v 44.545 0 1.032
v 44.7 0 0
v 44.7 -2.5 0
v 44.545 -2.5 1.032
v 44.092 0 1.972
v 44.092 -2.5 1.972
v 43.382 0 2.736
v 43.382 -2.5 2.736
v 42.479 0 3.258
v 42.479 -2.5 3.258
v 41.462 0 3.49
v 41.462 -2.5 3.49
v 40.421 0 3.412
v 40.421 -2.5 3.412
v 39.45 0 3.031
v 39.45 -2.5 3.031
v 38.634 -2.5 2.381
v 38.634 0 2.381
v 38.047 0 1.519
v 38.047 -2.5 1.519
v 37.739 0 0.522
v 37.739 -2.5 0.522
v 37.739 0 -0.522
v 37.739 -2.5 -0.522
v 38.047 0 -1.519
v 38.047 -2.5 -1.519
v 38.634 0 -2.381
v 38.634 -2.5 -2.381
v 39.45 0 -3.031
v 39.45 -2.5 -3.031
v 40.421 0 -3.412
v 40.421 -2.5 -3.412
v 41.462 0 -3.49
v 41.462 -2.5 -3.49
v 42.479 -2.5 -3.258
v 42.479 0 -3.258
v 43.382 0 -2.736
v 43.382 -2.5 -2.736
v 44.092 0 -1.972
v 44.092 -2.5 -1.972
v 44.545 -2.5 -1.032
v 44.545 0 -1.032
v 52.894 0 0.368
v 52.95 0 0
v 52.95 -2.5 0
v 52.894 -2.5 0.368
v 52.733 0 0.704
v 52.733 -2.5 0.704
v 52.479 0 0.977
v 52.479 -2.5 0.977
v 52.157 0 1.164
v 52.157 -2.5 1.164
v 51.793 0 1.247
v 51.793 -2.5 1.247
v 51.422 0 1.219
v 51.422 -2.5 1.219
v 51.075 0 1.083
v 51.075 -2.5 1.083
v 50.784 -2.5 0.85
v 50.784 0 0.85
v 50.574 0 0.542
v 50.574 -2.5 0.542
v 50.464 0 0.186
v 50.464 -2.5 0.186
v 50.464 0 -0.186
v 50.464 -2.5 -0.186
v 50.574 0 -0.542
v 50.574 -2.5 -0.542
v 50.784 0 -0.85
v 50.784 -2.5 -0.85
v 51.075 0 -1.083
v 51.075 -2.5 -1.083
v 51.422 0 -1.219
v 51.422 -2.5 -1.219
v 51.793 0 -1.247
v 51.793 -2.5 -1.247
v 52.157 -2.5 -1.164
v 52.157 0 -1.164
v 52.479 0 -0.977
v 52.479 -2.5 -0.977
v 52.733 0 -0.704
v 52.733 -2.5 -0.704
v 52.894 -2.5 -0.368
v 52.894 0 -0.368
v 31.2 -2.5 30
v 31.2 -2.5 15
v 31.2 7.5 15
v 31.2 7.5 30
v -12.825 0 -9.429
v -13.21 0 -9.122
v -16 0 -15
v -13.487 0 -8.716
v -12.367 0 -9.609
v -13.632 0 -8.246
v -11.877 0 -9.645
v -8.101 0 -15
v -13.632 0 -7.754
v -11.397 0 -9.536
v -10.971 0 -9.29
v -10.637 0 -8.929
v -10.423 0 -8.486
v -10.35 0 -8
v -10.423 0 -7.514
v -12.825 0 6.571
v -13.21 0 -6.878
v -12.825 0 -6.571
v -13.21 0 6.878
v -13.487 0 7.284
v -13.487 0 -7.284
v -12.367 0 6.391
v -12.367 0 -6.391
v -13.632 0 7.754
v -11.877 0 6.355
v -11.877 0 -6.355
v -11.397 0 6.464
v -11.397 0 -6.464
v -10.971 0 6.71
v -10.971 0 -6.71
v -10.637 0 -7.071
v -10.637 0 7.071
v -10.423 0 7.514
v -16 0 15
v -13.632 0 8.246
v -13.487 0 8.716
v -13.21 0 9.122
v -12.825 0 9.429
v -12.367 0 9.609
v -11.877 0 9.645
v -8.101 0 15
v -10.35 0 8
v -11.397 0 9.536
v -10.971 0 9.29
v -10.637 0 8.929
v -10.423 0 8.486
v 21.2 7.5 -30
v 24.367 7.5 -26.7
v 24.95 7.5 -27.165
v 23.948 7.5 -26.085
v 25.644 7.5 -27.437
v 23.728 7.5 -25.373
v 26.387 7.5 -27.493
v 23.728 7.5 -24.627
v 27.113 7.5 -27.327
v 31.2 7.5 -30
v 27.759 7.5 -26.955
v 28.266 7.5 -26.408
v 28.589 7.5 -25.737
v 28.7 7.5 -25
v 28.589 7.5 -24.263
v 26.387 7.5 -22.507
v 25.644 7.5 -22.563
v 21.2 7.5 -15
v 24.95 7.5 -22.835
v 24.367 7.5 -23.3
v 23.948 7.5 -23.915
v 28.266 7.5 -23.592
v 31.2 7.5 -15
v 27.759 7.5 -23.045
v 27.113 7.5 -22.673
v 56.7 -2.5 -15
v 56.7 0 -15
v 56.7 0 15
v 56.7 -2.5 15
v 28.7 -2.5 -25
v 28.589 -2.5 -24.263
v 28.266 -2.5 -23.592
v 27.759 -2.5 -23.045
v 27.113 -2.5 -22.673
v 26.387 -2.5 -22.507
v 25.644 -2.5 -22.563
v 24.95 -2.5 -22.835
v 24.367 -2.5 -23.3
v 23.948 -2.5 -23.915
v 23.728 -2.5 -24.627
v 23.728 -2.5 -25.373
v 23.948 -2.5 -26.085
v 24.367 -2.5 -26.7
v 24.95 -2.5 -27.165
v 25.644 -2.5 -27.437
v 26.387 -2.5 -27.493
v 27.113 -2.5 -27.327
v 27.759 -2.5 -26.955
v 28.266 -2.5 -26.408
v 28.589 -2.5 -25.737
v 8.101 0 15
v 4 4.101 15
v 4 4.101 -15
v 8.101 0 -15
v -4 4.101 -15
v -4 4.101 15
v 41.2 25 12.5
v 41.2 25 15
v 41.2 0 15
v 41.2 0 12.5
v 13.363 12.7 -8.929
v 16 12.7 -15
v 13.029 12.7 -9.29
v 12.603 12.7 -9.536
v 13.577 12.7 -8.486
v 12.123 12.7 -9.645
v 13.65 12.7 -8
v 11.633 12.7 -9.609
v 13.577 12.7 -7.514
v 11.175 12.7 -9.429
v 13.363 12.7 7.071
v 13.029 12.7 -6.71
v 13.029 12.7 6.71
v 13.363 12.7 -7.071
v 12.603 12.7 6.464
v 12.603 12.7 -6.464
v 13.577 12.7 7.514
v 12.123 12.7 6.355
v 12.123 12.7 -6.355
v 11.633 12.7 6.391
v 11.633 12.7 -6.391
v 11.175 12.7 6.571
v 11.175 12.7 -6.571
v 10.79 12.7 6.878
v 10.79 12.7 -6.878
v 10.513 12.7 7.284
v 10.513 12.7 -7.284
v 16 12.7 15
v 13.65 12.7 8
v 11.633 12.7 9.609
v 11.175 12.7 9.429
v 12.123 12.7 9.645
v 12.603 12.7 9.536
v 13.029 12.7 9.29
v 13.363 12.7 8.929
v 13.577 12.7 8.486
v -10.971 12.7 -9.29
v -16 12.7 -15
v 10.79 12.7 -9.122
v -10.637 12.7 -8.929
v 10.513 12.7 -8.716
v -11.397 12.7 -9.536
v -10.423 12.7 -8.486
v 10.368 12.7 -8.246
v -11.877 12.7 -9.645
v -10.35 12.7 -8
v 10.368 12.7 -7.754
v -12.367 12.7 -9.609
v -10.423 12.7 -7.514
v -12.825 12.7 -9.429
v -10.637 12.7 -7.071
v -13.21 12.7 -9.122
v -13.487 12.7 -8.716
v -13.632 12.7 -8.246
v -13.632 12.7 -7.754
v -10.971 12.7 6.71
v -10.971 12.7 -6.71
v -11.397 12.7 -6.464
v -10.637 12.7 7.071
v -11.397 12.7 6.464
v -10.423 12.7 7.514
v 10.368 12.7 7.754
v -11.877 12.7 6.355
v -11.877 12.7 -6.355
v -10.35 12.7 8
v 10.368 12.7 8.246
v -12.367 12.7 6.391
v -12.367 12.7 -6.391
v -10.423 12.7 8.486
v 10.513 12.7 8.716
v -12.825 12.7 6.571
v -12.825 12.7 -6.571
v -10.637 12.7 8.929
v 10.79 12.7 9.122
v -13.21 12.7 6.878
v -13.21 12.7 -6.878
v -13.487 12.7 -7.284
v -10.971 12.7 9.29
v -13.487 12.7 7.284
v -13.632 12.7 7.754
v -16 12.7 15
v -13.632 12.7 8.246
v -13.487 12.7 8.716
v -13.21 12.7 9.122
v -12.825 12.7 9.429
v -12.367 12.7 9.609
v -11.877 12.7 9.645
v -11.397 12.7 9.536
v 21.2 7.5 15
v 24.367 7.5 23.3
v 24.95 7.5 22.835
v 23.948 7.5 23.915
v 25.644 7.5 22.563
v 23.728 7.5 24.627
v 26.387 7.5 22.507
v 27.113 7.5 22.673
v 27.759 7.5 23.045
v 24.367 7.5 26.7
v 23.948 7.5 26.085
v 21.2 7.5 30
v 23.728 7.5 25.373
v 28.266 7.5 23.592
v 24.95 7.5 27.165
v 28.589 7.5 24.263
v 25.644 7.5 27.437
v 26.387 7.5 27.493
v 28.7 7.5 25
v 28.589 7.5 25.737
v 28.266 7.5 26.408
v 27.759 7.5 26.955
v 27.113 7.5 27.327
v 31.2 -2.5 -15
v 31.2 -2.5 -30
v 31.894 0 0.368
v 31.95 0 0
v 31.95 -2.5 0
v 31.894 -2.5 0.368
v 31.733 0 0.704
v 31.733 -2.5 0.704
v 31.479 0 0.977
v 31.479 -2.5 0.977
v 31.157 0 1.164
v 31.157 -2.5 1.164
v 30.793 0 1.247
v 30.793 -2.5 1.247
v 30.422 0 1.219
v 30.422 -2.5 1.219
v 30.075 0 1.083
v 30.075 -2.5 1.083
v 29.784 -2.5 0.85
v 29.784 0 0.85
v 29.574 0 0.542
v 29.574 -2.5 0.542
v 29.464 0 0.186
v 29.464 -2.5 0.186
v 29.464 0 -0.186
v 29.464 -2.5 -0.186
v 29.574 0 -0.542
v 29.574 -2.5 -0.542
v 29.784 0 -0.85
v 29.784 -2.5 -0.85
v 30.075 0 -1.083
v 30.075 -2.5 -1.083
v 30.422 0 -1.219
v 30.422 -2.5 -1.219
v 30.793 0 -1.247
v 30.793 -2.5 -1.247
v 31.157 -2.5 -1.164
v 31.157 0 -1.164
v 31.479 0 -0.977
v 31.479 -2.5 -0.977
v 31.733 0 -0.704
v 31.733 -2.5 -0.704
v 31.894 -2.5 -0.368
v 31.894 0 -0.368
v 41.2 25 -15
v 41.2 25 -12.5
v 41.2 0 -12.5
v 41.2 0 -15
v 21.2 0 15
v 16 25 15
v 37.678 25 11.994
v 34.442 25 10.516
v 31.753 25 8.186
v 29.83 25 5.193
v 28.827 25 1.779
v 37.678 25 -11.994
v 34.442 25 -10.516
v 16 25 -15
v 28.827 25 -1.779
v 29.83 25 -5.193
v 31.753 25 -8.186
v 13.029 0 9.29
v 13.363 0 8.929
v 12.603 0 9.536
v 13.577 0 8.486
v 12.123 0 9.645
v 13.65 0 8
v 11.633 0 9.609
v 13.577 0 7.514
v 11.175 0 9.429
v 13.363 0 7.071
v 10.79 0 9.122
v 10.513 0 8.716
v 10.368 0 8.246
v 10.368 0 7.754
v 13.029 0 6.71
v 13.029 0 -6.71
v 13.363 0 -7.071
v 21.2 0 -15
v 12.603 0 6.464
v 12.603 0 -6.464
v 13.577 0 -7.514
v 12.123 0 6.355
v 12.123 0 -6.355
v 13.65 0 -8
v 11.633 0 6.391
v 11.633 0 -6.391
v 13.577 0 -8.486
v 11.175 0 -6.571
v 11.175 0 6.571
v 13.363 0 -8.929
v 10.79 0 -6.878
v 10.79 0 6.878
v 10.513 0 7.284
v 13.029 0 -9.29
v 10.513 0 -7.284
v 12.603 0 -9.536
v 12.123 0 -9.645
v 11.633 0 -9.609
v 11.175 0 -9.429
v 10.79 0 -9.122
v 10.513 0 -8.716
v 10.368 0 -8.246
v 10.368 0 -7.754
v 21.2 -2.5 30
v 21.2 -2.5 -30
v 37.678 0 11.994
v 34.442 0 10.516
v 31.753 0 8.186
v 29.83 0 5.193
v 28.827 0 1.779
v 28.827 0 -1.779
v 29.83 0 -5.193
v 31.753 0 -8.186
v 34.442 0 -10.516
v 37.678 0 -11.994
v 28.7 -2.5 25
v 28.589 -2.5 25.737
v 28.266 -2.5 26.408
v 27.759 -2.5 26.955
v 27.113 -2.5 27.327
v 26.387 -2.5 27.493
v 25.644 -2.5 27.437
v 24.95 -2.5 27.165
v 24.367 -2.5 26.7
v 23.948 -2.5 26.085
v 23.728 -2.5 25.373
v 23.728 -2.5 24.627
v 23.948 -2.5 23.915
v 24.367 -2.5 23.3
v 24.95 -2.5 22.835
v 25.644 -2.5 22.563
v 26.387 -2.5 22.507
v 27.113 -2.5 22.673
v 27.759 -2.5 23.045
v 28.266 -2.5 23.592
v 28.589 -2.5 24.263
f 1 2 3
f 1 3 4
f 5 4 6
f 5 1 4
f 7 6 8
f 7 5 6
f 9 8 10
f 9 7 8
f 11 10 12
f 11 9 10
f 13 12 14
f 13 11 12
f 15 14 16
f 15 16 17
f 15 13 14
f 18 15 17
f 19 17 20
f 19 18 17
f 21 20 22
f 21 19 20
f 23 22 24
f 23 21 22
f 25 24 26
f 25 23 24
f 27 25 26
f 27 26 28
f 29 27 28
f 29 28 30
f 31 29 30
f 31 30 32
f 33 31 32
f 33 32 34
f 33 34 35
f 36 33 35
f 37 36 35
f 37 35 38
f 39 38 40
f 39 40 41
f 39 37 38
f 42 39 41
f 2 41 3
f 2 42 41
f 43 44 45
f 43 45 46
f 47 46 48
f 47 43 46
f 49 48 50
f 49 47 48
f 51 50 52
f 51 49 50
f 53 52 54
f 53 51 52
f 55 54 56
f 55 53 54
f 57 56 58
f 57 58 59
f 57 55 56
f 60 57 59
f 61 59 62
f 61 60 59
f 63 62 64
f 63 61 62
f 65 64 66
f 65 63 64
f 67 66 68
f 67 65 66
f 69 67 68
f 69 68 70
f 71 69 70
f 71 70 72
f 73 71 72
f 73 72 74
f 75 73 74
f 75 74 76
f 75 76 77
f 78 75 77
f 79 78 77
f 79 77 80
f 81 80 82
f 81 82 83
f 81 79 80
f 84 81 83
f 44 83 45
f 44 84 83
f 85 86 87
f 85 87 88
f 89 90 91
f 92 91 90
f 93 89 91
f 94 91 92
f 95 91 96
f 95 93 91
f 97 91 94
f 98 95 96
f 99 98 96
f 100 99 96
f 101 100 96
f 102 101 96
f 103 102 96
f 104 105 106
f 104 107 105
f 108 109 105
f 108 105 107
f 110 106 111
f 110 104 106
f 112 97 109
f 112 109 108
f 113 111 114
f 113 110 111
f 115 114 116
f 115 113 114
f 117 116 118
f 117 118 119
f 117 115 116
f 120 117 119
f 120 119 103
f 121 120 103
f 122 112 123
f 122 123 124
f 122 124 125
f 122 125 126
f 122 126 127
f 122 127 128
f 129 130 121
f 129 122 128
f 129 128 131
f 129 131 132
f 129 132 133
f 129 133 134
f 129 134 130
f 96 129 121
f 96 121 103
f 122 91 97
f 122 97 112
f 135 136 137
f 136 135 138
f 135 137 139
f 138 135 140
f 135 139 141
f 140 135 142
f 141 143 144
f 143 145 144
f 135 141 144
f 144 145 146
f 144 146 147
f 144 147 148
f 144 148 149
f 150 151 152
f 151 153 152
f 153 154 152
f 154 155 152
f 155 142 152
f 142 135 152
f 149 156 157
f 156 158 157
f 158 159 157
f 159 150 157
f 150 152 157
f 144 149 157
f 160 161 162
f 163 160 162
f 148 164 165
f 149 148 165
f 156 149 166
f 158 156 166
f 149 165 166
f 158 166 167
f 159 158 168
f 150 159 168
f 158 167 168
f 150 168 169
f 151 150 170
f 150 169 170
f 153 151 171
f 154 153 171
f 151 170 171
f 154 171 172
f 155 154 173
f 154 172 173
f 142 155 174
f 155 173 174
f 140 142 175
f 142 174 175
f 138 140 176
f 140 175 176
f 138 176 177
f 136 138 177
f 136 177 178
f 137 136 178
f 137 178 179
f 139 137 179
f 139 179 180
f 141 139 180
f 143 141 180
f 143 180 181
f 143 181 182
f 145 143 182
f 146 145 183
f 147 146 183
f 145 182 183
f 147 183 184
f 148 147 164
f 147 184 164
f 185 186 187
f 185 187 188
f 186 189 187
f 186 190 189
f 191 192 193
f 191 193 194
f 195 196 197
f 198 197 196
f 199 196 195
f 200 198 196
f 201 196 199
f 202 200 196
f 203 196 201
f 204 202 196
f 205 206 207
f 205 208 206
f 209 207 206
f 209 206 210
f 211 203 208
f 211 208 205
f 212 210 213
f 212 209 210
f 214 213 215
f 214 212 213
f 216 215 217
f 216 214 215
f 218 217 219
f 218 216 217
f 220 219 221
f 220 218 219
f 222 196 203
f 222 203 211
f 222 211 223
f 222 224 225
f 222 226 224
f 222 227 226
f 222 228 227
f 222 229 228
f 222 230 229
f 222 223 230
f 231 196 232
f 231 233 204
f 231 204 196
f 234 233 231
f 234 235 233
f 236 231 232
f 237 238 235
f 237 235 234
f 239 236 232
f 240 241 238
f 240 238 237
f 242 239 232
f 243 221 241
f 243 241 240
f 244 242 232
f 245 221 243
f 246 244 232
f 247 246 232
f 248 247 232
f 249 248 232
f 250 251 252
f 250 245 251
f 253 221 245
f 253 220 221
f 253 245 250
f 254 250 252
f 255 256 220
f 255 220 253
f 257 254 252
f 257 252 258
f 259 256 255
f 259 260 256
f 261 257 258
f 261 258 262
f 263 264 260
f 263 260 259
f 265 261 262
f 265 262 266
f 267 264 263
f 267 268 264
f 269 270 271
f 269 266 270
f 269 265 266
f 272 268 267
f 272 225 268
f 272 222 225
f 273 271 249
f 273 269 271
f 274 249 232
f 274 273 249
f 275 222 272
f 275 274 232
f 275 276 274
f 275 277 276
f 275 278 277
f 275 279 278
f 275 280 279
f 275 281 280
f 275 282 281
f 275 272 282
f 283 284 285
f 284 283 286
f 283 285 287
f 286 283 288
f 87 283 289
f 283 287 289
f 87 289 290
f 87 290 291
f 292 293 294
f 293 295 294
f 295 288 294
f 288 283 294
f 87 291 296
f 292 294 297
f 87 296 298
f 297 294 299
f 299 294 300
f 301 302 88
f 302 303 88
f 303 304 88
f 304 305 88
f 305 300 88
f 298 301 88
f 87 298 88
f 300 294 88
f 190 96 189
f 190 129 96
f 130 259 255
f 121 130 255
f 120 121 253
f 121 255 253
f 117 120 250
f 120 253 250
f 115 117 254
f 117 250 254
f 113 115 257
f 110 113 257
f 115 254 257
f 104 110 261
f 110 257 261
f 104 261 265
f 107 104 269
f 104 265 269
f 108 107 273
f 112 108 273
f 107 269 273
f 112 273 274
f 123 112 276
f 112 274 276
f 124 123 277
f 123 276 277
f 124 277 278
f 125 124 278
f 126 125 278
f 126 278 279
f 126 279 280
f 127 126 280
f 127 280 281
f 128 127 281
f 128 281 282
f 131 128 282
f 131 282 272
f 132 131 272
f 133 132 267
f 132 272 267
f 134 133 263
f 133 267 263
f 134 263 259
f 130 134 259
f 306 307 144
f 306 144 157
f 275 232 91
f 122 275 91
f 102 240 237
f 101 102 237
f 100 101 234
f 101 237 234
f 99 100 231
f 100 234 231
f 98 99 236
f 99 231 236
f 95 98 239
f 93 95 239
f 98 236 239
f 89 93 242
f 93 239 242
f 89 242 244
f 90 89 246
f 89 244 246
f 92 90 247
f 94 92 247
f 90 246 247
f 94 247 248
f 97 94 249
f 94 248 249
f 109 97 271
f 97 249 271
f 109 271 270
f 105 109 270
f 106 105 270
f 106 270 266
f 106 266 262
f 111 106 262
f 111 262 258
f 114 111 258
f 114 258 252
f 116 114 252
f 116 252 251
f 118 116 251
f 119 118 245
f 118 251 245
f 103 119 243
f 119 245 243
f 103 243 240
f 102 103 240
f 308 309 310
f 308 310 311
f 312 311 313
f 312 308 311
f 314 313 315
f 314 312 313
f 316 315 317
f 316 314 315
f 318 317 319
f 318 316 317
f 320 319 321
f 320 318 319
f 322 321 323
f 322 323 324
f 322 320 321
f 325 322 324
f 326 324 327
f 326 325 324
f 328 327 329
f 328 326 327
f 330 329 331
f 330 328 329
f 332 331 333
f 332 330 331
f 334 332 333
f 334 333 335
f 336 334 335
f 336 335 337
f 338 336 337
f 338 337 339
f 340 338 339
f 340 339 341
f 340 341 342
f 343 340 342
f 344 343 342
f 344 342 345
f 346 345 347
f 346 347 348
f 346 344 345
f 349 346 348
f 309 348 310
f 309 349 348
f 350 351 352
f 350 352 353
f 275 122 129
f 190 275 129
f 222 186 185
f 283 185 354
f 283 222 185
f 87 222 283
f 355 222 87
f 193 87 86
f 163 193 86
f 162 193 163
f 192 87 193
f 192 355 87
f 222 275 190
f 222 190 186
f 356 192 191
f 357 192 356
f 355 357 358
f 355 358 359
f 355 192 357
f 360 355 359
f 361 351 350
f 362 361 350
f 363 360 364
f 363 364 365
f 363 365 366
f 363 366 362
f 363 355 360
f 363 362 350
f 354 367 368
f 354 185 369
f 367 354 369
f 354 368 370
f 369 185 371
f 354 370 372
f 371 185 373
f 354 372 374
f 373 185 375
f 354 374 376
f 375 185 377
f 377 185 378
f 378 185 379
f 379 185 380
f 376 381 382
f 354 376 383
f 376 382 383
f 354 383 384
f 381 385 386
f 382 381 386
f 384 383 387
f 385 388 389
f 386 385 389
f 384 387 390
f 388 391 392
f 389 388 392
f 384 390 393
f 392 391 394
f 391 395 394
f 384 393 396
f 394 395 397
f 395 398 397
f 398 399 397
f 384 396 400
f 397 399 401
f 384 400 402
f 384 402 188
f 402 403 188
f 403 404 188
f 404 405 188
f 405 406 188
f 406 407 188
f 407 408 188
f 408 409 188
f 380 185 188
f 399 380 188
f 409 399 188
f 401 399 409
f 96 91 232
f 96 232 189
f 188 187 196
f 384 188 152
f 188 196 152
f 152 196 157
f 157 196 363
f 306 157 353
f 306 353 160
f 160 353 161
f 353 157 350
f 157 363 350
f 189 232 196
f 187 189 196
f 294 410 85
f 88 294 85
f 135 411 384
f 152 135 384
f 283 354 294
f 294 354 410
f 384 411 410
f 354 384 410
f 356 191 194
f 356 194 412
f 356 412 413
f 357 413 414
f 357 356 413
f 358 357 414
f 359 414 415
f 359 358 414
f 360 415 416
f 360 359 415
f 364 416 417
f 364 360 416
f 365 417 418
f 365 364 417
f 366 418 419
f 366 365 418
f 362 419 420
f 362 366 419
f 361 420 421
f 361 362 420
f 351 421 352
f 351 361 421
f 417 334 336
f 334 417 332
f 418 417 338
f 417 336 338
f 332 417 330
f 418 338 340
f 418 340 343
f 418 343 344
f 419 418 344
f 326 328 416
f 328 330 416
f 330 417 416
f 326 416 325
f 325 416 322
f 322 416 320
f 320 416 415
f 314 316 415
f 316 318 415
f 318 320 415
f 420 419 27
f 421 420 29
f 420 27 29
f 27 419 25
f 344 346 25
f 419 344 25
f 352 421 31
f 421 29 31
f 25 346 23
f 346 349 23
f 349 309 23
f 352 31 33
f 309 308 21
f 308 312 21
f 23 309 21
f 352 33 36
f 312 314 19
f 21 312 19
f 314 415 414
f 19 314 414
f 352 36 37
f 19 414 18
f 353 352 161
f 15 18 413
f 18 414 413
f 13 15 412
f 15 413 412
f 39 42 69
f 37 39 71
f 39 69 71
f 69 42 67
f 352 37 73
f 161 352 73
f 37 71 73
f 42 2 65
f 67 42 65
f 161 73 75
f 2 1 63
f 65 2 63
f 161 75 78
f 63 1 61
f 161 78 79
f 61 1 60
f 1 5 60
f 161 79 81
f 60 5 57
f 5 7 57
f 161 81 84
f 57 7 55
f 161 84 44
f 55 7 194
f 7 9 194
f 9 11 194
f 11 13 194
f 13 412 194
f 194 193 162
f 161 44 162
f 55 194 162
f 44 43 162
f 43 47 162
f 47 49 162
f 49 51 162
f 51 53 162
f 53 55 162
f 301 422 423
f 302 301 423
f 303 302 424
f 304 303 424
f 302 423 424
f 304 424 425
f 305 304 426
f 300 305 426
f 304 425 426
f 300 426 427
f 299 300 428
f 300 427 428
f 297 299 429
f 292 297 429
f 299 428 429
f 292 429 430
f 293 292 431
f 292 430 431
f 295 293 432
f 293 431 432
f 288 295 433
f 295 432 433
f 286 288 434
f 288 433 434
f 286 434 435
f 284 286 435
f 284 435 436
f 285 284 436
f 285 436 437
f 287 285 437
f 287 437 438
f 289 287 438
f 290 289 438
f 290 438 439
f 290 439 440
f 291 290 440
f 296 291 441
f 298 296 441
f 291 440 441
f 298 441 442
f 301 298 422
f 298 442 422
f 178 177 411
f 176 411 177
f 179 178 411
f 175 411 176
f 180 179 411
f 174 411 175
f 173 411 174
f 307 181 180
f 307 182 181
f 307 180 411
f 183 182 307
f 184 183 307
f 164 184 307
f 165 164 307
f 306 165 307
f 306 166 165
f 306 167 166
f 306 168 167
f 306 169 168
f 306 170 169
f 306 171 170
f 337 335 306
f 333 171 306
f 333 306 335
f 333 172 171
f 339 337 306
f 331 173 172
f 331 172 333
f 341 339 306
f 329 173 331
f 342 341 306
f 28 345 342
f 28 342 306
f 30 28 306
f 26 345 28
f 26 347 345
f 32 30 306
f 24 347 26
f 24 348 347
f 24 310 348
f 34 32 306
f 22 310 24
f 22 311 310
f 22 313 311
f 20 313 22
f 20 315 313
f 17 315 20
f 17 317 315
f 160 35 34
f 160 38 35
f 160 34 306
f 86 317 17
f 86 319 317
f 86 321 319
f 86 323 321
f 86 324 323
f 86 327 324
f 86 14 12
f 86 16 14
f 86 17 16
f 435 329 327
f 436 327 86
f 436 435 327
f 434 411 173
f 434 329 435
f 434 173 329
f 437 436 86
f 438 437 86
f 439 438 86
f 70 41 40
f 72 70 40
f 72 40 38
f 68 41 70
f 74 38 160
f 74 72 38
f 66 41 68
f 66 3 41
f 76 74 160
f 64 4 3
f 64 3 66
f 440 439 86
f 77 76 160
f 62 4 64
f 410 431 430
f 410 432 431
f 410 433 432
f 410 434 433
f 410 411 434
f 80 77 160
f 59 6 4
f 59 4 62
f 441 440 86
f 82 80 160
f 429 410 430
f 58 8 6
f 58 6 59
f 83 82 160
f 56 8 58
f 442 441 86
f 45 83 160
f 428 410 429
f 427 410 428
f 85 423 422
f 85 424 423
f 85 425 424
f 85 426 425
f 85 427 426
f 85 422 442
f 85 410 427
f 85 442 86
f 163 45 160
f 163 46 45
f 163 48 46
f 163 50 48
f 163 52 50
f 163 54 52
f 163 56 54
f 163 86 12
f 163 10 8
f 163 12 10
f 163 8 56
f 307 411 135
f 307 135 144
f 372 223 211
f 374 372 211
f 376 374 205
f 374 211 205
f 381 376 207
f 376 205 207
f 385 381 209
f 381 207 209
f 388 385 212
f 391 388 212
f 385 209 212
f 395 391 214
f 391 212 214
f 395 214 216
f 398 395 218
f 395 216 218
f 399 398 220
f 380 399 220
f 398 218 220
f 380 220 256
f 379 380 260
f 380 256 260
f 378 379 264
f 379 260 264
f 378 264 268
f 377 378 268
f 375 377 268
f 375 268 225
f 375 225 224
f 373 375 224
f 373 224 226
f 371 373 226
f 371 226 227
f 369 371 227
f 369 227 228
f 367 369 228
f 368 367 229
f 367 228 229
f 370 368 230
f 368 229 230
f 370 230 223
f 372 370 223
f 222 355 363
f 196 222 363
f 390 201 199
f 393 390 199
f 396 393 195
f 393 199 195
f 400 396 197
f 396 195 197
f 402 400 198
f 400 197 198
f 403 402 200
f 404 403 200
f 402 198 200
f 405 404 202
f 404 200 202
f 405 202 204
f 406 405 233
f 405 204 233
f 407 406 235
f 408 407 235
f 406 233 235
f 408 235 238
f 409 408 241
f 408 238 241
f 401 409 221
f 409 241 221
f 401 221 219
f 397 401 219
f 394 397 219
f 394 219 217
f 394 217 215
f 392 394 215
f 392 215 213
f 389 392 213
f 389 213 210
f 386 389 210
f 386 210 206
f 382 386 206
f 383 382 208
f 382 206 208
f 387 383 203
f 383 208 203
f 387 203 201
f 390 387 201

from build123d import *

# Parameters (mm, degrees)
BOSS_EXTRUDE1_DEPTH  = 15
SKETCH2_R            = 1.65
CUT_EXTRUDE1_DEPTH   = 12.7
SKETCH12_W           = 30
SKETCH12_H           = 25
BOSS_EXTRUDE9_DEPTH  = 25.2
CUT_EXTRUDE2_DEPTH   = 25
SKETCH14_W           = 35.5
SKETCH14_H           = 30
SKETCH14_R           = 3.5
SKETCH14_R_2         = 1.25
BOSS_EXTRUDE10_DEPTH = 2.5
SKETCH15_W           = 10
SKETCH15_H           = 15
SKETCH15_R           = 2.5
BOSS_EXTRUDE11_DEPTH = 10


with BuildPart() as part:
    # Sketch1 → Boss-Extrude1 (new body, symmetric)
    with BuildSketch(Plane.XY):
        Polygon((-4, 4.101219331), (4, 4.101219331), (8.101219331, 0), (16, 0), (16, 12.7), (-16, 12.7), (-16, 0), (-8.101219331, 0), align=None)
    extrude(amount=BOSS_EXTRUDE1_DEPTH, both=True)

    # Sketch2 → Cut-Extrude1 (cut)
    with BuildSketch(Plane(origin=(0, 12.7, 0), x_dir=(1, 0, 0), z_dir=(0, 1, 0))):
        with Locations((12, 8)):
            Circle(SKETCH2_R)
        with Locations((12, -8)):
            Circle(SKETCH2_R)
        with Locations((-12, -8)):
            Circle(SKETCH2_R)
        with Locations((-12, 8)):
            Circle(SKETCH2_R)
    extrude(amount=-CUT_EXTRUDE1_DEPTH, mode=Mode.SUBTRACT)

    # Sketch12 → Boss-Extrude9 (add)
    with BuildSketch(Plane(origin=(16, 0, 0), x_dir=(0, 0, -1), z_dir=(1, 0, 0))):
        with Locations((0, 12.5)):
            Rectangle(SKETCH12_W, SKETCH12_H)
    extrude(amount=BOSS_EXTRUDE9_DEPTH)

    # Sketch13 → Cut-Extrude2 (cut)
    with BuildSketch(Plane(origin=(0, 25, 0), x_dir=(1, 0, 0), z_dir=(0, 1, 0))):
        with BuildLine():
            Line((41.2, 12.5), (41.2, -12.5))
            ThreePointArc((41.2, -12.5), (28.7, 0), (41.2, 12.5))
        make_face()
    extrude(amount=-CUT_EXTRUDE2_DEPTH, mode=Mode.SUBTRACT)

    # Sketch14 → Boss-Extrude10 (add)
    with BuildSketch(Plane.XZ):
        with Locations((38.95, 0)):
            Rectangle(SKETCH14_W, SKETCH14_H)
        with Locations((41.2, 0)):
            Circle(SKETCH14_R, mode=Mode.SUBTRACT)
        with Locations((51.7, 0)):
            Circle(SKETCH14_R_2, mode=Mode.SUBTRACT)
        with Locations((30.7, 0)):
            Circle(SKETCH14_R_2, mode=Mode.SUBTRACT)
    extrude(amount=BOSS_EXTRUDE10_DEPTH)

    # Sketch15 → Boss-Extrude11 (add)
    with BuildSketch(Plane.XZ.offset(2.5)):
        with Locations((26.2, 22.5)):
            Rectangle(SKETCH15_W, SKETCH15_H)
        with Locations((26.2, 25)):
            Circle(SKETCH15_R, mode=Mode.SUBTRACT)
        with Locations((26.2, -22.5)):
            Rectangle(SKETCH15_W, SKETCH15_H)
        with Locations((26.2, -25)):
            Circle(SKETCH15_R, mode=Mode.SUBTRACT)
    extrude(amount=-BOSS_EXTRUDE11_DEPTH)


solid = part.part
